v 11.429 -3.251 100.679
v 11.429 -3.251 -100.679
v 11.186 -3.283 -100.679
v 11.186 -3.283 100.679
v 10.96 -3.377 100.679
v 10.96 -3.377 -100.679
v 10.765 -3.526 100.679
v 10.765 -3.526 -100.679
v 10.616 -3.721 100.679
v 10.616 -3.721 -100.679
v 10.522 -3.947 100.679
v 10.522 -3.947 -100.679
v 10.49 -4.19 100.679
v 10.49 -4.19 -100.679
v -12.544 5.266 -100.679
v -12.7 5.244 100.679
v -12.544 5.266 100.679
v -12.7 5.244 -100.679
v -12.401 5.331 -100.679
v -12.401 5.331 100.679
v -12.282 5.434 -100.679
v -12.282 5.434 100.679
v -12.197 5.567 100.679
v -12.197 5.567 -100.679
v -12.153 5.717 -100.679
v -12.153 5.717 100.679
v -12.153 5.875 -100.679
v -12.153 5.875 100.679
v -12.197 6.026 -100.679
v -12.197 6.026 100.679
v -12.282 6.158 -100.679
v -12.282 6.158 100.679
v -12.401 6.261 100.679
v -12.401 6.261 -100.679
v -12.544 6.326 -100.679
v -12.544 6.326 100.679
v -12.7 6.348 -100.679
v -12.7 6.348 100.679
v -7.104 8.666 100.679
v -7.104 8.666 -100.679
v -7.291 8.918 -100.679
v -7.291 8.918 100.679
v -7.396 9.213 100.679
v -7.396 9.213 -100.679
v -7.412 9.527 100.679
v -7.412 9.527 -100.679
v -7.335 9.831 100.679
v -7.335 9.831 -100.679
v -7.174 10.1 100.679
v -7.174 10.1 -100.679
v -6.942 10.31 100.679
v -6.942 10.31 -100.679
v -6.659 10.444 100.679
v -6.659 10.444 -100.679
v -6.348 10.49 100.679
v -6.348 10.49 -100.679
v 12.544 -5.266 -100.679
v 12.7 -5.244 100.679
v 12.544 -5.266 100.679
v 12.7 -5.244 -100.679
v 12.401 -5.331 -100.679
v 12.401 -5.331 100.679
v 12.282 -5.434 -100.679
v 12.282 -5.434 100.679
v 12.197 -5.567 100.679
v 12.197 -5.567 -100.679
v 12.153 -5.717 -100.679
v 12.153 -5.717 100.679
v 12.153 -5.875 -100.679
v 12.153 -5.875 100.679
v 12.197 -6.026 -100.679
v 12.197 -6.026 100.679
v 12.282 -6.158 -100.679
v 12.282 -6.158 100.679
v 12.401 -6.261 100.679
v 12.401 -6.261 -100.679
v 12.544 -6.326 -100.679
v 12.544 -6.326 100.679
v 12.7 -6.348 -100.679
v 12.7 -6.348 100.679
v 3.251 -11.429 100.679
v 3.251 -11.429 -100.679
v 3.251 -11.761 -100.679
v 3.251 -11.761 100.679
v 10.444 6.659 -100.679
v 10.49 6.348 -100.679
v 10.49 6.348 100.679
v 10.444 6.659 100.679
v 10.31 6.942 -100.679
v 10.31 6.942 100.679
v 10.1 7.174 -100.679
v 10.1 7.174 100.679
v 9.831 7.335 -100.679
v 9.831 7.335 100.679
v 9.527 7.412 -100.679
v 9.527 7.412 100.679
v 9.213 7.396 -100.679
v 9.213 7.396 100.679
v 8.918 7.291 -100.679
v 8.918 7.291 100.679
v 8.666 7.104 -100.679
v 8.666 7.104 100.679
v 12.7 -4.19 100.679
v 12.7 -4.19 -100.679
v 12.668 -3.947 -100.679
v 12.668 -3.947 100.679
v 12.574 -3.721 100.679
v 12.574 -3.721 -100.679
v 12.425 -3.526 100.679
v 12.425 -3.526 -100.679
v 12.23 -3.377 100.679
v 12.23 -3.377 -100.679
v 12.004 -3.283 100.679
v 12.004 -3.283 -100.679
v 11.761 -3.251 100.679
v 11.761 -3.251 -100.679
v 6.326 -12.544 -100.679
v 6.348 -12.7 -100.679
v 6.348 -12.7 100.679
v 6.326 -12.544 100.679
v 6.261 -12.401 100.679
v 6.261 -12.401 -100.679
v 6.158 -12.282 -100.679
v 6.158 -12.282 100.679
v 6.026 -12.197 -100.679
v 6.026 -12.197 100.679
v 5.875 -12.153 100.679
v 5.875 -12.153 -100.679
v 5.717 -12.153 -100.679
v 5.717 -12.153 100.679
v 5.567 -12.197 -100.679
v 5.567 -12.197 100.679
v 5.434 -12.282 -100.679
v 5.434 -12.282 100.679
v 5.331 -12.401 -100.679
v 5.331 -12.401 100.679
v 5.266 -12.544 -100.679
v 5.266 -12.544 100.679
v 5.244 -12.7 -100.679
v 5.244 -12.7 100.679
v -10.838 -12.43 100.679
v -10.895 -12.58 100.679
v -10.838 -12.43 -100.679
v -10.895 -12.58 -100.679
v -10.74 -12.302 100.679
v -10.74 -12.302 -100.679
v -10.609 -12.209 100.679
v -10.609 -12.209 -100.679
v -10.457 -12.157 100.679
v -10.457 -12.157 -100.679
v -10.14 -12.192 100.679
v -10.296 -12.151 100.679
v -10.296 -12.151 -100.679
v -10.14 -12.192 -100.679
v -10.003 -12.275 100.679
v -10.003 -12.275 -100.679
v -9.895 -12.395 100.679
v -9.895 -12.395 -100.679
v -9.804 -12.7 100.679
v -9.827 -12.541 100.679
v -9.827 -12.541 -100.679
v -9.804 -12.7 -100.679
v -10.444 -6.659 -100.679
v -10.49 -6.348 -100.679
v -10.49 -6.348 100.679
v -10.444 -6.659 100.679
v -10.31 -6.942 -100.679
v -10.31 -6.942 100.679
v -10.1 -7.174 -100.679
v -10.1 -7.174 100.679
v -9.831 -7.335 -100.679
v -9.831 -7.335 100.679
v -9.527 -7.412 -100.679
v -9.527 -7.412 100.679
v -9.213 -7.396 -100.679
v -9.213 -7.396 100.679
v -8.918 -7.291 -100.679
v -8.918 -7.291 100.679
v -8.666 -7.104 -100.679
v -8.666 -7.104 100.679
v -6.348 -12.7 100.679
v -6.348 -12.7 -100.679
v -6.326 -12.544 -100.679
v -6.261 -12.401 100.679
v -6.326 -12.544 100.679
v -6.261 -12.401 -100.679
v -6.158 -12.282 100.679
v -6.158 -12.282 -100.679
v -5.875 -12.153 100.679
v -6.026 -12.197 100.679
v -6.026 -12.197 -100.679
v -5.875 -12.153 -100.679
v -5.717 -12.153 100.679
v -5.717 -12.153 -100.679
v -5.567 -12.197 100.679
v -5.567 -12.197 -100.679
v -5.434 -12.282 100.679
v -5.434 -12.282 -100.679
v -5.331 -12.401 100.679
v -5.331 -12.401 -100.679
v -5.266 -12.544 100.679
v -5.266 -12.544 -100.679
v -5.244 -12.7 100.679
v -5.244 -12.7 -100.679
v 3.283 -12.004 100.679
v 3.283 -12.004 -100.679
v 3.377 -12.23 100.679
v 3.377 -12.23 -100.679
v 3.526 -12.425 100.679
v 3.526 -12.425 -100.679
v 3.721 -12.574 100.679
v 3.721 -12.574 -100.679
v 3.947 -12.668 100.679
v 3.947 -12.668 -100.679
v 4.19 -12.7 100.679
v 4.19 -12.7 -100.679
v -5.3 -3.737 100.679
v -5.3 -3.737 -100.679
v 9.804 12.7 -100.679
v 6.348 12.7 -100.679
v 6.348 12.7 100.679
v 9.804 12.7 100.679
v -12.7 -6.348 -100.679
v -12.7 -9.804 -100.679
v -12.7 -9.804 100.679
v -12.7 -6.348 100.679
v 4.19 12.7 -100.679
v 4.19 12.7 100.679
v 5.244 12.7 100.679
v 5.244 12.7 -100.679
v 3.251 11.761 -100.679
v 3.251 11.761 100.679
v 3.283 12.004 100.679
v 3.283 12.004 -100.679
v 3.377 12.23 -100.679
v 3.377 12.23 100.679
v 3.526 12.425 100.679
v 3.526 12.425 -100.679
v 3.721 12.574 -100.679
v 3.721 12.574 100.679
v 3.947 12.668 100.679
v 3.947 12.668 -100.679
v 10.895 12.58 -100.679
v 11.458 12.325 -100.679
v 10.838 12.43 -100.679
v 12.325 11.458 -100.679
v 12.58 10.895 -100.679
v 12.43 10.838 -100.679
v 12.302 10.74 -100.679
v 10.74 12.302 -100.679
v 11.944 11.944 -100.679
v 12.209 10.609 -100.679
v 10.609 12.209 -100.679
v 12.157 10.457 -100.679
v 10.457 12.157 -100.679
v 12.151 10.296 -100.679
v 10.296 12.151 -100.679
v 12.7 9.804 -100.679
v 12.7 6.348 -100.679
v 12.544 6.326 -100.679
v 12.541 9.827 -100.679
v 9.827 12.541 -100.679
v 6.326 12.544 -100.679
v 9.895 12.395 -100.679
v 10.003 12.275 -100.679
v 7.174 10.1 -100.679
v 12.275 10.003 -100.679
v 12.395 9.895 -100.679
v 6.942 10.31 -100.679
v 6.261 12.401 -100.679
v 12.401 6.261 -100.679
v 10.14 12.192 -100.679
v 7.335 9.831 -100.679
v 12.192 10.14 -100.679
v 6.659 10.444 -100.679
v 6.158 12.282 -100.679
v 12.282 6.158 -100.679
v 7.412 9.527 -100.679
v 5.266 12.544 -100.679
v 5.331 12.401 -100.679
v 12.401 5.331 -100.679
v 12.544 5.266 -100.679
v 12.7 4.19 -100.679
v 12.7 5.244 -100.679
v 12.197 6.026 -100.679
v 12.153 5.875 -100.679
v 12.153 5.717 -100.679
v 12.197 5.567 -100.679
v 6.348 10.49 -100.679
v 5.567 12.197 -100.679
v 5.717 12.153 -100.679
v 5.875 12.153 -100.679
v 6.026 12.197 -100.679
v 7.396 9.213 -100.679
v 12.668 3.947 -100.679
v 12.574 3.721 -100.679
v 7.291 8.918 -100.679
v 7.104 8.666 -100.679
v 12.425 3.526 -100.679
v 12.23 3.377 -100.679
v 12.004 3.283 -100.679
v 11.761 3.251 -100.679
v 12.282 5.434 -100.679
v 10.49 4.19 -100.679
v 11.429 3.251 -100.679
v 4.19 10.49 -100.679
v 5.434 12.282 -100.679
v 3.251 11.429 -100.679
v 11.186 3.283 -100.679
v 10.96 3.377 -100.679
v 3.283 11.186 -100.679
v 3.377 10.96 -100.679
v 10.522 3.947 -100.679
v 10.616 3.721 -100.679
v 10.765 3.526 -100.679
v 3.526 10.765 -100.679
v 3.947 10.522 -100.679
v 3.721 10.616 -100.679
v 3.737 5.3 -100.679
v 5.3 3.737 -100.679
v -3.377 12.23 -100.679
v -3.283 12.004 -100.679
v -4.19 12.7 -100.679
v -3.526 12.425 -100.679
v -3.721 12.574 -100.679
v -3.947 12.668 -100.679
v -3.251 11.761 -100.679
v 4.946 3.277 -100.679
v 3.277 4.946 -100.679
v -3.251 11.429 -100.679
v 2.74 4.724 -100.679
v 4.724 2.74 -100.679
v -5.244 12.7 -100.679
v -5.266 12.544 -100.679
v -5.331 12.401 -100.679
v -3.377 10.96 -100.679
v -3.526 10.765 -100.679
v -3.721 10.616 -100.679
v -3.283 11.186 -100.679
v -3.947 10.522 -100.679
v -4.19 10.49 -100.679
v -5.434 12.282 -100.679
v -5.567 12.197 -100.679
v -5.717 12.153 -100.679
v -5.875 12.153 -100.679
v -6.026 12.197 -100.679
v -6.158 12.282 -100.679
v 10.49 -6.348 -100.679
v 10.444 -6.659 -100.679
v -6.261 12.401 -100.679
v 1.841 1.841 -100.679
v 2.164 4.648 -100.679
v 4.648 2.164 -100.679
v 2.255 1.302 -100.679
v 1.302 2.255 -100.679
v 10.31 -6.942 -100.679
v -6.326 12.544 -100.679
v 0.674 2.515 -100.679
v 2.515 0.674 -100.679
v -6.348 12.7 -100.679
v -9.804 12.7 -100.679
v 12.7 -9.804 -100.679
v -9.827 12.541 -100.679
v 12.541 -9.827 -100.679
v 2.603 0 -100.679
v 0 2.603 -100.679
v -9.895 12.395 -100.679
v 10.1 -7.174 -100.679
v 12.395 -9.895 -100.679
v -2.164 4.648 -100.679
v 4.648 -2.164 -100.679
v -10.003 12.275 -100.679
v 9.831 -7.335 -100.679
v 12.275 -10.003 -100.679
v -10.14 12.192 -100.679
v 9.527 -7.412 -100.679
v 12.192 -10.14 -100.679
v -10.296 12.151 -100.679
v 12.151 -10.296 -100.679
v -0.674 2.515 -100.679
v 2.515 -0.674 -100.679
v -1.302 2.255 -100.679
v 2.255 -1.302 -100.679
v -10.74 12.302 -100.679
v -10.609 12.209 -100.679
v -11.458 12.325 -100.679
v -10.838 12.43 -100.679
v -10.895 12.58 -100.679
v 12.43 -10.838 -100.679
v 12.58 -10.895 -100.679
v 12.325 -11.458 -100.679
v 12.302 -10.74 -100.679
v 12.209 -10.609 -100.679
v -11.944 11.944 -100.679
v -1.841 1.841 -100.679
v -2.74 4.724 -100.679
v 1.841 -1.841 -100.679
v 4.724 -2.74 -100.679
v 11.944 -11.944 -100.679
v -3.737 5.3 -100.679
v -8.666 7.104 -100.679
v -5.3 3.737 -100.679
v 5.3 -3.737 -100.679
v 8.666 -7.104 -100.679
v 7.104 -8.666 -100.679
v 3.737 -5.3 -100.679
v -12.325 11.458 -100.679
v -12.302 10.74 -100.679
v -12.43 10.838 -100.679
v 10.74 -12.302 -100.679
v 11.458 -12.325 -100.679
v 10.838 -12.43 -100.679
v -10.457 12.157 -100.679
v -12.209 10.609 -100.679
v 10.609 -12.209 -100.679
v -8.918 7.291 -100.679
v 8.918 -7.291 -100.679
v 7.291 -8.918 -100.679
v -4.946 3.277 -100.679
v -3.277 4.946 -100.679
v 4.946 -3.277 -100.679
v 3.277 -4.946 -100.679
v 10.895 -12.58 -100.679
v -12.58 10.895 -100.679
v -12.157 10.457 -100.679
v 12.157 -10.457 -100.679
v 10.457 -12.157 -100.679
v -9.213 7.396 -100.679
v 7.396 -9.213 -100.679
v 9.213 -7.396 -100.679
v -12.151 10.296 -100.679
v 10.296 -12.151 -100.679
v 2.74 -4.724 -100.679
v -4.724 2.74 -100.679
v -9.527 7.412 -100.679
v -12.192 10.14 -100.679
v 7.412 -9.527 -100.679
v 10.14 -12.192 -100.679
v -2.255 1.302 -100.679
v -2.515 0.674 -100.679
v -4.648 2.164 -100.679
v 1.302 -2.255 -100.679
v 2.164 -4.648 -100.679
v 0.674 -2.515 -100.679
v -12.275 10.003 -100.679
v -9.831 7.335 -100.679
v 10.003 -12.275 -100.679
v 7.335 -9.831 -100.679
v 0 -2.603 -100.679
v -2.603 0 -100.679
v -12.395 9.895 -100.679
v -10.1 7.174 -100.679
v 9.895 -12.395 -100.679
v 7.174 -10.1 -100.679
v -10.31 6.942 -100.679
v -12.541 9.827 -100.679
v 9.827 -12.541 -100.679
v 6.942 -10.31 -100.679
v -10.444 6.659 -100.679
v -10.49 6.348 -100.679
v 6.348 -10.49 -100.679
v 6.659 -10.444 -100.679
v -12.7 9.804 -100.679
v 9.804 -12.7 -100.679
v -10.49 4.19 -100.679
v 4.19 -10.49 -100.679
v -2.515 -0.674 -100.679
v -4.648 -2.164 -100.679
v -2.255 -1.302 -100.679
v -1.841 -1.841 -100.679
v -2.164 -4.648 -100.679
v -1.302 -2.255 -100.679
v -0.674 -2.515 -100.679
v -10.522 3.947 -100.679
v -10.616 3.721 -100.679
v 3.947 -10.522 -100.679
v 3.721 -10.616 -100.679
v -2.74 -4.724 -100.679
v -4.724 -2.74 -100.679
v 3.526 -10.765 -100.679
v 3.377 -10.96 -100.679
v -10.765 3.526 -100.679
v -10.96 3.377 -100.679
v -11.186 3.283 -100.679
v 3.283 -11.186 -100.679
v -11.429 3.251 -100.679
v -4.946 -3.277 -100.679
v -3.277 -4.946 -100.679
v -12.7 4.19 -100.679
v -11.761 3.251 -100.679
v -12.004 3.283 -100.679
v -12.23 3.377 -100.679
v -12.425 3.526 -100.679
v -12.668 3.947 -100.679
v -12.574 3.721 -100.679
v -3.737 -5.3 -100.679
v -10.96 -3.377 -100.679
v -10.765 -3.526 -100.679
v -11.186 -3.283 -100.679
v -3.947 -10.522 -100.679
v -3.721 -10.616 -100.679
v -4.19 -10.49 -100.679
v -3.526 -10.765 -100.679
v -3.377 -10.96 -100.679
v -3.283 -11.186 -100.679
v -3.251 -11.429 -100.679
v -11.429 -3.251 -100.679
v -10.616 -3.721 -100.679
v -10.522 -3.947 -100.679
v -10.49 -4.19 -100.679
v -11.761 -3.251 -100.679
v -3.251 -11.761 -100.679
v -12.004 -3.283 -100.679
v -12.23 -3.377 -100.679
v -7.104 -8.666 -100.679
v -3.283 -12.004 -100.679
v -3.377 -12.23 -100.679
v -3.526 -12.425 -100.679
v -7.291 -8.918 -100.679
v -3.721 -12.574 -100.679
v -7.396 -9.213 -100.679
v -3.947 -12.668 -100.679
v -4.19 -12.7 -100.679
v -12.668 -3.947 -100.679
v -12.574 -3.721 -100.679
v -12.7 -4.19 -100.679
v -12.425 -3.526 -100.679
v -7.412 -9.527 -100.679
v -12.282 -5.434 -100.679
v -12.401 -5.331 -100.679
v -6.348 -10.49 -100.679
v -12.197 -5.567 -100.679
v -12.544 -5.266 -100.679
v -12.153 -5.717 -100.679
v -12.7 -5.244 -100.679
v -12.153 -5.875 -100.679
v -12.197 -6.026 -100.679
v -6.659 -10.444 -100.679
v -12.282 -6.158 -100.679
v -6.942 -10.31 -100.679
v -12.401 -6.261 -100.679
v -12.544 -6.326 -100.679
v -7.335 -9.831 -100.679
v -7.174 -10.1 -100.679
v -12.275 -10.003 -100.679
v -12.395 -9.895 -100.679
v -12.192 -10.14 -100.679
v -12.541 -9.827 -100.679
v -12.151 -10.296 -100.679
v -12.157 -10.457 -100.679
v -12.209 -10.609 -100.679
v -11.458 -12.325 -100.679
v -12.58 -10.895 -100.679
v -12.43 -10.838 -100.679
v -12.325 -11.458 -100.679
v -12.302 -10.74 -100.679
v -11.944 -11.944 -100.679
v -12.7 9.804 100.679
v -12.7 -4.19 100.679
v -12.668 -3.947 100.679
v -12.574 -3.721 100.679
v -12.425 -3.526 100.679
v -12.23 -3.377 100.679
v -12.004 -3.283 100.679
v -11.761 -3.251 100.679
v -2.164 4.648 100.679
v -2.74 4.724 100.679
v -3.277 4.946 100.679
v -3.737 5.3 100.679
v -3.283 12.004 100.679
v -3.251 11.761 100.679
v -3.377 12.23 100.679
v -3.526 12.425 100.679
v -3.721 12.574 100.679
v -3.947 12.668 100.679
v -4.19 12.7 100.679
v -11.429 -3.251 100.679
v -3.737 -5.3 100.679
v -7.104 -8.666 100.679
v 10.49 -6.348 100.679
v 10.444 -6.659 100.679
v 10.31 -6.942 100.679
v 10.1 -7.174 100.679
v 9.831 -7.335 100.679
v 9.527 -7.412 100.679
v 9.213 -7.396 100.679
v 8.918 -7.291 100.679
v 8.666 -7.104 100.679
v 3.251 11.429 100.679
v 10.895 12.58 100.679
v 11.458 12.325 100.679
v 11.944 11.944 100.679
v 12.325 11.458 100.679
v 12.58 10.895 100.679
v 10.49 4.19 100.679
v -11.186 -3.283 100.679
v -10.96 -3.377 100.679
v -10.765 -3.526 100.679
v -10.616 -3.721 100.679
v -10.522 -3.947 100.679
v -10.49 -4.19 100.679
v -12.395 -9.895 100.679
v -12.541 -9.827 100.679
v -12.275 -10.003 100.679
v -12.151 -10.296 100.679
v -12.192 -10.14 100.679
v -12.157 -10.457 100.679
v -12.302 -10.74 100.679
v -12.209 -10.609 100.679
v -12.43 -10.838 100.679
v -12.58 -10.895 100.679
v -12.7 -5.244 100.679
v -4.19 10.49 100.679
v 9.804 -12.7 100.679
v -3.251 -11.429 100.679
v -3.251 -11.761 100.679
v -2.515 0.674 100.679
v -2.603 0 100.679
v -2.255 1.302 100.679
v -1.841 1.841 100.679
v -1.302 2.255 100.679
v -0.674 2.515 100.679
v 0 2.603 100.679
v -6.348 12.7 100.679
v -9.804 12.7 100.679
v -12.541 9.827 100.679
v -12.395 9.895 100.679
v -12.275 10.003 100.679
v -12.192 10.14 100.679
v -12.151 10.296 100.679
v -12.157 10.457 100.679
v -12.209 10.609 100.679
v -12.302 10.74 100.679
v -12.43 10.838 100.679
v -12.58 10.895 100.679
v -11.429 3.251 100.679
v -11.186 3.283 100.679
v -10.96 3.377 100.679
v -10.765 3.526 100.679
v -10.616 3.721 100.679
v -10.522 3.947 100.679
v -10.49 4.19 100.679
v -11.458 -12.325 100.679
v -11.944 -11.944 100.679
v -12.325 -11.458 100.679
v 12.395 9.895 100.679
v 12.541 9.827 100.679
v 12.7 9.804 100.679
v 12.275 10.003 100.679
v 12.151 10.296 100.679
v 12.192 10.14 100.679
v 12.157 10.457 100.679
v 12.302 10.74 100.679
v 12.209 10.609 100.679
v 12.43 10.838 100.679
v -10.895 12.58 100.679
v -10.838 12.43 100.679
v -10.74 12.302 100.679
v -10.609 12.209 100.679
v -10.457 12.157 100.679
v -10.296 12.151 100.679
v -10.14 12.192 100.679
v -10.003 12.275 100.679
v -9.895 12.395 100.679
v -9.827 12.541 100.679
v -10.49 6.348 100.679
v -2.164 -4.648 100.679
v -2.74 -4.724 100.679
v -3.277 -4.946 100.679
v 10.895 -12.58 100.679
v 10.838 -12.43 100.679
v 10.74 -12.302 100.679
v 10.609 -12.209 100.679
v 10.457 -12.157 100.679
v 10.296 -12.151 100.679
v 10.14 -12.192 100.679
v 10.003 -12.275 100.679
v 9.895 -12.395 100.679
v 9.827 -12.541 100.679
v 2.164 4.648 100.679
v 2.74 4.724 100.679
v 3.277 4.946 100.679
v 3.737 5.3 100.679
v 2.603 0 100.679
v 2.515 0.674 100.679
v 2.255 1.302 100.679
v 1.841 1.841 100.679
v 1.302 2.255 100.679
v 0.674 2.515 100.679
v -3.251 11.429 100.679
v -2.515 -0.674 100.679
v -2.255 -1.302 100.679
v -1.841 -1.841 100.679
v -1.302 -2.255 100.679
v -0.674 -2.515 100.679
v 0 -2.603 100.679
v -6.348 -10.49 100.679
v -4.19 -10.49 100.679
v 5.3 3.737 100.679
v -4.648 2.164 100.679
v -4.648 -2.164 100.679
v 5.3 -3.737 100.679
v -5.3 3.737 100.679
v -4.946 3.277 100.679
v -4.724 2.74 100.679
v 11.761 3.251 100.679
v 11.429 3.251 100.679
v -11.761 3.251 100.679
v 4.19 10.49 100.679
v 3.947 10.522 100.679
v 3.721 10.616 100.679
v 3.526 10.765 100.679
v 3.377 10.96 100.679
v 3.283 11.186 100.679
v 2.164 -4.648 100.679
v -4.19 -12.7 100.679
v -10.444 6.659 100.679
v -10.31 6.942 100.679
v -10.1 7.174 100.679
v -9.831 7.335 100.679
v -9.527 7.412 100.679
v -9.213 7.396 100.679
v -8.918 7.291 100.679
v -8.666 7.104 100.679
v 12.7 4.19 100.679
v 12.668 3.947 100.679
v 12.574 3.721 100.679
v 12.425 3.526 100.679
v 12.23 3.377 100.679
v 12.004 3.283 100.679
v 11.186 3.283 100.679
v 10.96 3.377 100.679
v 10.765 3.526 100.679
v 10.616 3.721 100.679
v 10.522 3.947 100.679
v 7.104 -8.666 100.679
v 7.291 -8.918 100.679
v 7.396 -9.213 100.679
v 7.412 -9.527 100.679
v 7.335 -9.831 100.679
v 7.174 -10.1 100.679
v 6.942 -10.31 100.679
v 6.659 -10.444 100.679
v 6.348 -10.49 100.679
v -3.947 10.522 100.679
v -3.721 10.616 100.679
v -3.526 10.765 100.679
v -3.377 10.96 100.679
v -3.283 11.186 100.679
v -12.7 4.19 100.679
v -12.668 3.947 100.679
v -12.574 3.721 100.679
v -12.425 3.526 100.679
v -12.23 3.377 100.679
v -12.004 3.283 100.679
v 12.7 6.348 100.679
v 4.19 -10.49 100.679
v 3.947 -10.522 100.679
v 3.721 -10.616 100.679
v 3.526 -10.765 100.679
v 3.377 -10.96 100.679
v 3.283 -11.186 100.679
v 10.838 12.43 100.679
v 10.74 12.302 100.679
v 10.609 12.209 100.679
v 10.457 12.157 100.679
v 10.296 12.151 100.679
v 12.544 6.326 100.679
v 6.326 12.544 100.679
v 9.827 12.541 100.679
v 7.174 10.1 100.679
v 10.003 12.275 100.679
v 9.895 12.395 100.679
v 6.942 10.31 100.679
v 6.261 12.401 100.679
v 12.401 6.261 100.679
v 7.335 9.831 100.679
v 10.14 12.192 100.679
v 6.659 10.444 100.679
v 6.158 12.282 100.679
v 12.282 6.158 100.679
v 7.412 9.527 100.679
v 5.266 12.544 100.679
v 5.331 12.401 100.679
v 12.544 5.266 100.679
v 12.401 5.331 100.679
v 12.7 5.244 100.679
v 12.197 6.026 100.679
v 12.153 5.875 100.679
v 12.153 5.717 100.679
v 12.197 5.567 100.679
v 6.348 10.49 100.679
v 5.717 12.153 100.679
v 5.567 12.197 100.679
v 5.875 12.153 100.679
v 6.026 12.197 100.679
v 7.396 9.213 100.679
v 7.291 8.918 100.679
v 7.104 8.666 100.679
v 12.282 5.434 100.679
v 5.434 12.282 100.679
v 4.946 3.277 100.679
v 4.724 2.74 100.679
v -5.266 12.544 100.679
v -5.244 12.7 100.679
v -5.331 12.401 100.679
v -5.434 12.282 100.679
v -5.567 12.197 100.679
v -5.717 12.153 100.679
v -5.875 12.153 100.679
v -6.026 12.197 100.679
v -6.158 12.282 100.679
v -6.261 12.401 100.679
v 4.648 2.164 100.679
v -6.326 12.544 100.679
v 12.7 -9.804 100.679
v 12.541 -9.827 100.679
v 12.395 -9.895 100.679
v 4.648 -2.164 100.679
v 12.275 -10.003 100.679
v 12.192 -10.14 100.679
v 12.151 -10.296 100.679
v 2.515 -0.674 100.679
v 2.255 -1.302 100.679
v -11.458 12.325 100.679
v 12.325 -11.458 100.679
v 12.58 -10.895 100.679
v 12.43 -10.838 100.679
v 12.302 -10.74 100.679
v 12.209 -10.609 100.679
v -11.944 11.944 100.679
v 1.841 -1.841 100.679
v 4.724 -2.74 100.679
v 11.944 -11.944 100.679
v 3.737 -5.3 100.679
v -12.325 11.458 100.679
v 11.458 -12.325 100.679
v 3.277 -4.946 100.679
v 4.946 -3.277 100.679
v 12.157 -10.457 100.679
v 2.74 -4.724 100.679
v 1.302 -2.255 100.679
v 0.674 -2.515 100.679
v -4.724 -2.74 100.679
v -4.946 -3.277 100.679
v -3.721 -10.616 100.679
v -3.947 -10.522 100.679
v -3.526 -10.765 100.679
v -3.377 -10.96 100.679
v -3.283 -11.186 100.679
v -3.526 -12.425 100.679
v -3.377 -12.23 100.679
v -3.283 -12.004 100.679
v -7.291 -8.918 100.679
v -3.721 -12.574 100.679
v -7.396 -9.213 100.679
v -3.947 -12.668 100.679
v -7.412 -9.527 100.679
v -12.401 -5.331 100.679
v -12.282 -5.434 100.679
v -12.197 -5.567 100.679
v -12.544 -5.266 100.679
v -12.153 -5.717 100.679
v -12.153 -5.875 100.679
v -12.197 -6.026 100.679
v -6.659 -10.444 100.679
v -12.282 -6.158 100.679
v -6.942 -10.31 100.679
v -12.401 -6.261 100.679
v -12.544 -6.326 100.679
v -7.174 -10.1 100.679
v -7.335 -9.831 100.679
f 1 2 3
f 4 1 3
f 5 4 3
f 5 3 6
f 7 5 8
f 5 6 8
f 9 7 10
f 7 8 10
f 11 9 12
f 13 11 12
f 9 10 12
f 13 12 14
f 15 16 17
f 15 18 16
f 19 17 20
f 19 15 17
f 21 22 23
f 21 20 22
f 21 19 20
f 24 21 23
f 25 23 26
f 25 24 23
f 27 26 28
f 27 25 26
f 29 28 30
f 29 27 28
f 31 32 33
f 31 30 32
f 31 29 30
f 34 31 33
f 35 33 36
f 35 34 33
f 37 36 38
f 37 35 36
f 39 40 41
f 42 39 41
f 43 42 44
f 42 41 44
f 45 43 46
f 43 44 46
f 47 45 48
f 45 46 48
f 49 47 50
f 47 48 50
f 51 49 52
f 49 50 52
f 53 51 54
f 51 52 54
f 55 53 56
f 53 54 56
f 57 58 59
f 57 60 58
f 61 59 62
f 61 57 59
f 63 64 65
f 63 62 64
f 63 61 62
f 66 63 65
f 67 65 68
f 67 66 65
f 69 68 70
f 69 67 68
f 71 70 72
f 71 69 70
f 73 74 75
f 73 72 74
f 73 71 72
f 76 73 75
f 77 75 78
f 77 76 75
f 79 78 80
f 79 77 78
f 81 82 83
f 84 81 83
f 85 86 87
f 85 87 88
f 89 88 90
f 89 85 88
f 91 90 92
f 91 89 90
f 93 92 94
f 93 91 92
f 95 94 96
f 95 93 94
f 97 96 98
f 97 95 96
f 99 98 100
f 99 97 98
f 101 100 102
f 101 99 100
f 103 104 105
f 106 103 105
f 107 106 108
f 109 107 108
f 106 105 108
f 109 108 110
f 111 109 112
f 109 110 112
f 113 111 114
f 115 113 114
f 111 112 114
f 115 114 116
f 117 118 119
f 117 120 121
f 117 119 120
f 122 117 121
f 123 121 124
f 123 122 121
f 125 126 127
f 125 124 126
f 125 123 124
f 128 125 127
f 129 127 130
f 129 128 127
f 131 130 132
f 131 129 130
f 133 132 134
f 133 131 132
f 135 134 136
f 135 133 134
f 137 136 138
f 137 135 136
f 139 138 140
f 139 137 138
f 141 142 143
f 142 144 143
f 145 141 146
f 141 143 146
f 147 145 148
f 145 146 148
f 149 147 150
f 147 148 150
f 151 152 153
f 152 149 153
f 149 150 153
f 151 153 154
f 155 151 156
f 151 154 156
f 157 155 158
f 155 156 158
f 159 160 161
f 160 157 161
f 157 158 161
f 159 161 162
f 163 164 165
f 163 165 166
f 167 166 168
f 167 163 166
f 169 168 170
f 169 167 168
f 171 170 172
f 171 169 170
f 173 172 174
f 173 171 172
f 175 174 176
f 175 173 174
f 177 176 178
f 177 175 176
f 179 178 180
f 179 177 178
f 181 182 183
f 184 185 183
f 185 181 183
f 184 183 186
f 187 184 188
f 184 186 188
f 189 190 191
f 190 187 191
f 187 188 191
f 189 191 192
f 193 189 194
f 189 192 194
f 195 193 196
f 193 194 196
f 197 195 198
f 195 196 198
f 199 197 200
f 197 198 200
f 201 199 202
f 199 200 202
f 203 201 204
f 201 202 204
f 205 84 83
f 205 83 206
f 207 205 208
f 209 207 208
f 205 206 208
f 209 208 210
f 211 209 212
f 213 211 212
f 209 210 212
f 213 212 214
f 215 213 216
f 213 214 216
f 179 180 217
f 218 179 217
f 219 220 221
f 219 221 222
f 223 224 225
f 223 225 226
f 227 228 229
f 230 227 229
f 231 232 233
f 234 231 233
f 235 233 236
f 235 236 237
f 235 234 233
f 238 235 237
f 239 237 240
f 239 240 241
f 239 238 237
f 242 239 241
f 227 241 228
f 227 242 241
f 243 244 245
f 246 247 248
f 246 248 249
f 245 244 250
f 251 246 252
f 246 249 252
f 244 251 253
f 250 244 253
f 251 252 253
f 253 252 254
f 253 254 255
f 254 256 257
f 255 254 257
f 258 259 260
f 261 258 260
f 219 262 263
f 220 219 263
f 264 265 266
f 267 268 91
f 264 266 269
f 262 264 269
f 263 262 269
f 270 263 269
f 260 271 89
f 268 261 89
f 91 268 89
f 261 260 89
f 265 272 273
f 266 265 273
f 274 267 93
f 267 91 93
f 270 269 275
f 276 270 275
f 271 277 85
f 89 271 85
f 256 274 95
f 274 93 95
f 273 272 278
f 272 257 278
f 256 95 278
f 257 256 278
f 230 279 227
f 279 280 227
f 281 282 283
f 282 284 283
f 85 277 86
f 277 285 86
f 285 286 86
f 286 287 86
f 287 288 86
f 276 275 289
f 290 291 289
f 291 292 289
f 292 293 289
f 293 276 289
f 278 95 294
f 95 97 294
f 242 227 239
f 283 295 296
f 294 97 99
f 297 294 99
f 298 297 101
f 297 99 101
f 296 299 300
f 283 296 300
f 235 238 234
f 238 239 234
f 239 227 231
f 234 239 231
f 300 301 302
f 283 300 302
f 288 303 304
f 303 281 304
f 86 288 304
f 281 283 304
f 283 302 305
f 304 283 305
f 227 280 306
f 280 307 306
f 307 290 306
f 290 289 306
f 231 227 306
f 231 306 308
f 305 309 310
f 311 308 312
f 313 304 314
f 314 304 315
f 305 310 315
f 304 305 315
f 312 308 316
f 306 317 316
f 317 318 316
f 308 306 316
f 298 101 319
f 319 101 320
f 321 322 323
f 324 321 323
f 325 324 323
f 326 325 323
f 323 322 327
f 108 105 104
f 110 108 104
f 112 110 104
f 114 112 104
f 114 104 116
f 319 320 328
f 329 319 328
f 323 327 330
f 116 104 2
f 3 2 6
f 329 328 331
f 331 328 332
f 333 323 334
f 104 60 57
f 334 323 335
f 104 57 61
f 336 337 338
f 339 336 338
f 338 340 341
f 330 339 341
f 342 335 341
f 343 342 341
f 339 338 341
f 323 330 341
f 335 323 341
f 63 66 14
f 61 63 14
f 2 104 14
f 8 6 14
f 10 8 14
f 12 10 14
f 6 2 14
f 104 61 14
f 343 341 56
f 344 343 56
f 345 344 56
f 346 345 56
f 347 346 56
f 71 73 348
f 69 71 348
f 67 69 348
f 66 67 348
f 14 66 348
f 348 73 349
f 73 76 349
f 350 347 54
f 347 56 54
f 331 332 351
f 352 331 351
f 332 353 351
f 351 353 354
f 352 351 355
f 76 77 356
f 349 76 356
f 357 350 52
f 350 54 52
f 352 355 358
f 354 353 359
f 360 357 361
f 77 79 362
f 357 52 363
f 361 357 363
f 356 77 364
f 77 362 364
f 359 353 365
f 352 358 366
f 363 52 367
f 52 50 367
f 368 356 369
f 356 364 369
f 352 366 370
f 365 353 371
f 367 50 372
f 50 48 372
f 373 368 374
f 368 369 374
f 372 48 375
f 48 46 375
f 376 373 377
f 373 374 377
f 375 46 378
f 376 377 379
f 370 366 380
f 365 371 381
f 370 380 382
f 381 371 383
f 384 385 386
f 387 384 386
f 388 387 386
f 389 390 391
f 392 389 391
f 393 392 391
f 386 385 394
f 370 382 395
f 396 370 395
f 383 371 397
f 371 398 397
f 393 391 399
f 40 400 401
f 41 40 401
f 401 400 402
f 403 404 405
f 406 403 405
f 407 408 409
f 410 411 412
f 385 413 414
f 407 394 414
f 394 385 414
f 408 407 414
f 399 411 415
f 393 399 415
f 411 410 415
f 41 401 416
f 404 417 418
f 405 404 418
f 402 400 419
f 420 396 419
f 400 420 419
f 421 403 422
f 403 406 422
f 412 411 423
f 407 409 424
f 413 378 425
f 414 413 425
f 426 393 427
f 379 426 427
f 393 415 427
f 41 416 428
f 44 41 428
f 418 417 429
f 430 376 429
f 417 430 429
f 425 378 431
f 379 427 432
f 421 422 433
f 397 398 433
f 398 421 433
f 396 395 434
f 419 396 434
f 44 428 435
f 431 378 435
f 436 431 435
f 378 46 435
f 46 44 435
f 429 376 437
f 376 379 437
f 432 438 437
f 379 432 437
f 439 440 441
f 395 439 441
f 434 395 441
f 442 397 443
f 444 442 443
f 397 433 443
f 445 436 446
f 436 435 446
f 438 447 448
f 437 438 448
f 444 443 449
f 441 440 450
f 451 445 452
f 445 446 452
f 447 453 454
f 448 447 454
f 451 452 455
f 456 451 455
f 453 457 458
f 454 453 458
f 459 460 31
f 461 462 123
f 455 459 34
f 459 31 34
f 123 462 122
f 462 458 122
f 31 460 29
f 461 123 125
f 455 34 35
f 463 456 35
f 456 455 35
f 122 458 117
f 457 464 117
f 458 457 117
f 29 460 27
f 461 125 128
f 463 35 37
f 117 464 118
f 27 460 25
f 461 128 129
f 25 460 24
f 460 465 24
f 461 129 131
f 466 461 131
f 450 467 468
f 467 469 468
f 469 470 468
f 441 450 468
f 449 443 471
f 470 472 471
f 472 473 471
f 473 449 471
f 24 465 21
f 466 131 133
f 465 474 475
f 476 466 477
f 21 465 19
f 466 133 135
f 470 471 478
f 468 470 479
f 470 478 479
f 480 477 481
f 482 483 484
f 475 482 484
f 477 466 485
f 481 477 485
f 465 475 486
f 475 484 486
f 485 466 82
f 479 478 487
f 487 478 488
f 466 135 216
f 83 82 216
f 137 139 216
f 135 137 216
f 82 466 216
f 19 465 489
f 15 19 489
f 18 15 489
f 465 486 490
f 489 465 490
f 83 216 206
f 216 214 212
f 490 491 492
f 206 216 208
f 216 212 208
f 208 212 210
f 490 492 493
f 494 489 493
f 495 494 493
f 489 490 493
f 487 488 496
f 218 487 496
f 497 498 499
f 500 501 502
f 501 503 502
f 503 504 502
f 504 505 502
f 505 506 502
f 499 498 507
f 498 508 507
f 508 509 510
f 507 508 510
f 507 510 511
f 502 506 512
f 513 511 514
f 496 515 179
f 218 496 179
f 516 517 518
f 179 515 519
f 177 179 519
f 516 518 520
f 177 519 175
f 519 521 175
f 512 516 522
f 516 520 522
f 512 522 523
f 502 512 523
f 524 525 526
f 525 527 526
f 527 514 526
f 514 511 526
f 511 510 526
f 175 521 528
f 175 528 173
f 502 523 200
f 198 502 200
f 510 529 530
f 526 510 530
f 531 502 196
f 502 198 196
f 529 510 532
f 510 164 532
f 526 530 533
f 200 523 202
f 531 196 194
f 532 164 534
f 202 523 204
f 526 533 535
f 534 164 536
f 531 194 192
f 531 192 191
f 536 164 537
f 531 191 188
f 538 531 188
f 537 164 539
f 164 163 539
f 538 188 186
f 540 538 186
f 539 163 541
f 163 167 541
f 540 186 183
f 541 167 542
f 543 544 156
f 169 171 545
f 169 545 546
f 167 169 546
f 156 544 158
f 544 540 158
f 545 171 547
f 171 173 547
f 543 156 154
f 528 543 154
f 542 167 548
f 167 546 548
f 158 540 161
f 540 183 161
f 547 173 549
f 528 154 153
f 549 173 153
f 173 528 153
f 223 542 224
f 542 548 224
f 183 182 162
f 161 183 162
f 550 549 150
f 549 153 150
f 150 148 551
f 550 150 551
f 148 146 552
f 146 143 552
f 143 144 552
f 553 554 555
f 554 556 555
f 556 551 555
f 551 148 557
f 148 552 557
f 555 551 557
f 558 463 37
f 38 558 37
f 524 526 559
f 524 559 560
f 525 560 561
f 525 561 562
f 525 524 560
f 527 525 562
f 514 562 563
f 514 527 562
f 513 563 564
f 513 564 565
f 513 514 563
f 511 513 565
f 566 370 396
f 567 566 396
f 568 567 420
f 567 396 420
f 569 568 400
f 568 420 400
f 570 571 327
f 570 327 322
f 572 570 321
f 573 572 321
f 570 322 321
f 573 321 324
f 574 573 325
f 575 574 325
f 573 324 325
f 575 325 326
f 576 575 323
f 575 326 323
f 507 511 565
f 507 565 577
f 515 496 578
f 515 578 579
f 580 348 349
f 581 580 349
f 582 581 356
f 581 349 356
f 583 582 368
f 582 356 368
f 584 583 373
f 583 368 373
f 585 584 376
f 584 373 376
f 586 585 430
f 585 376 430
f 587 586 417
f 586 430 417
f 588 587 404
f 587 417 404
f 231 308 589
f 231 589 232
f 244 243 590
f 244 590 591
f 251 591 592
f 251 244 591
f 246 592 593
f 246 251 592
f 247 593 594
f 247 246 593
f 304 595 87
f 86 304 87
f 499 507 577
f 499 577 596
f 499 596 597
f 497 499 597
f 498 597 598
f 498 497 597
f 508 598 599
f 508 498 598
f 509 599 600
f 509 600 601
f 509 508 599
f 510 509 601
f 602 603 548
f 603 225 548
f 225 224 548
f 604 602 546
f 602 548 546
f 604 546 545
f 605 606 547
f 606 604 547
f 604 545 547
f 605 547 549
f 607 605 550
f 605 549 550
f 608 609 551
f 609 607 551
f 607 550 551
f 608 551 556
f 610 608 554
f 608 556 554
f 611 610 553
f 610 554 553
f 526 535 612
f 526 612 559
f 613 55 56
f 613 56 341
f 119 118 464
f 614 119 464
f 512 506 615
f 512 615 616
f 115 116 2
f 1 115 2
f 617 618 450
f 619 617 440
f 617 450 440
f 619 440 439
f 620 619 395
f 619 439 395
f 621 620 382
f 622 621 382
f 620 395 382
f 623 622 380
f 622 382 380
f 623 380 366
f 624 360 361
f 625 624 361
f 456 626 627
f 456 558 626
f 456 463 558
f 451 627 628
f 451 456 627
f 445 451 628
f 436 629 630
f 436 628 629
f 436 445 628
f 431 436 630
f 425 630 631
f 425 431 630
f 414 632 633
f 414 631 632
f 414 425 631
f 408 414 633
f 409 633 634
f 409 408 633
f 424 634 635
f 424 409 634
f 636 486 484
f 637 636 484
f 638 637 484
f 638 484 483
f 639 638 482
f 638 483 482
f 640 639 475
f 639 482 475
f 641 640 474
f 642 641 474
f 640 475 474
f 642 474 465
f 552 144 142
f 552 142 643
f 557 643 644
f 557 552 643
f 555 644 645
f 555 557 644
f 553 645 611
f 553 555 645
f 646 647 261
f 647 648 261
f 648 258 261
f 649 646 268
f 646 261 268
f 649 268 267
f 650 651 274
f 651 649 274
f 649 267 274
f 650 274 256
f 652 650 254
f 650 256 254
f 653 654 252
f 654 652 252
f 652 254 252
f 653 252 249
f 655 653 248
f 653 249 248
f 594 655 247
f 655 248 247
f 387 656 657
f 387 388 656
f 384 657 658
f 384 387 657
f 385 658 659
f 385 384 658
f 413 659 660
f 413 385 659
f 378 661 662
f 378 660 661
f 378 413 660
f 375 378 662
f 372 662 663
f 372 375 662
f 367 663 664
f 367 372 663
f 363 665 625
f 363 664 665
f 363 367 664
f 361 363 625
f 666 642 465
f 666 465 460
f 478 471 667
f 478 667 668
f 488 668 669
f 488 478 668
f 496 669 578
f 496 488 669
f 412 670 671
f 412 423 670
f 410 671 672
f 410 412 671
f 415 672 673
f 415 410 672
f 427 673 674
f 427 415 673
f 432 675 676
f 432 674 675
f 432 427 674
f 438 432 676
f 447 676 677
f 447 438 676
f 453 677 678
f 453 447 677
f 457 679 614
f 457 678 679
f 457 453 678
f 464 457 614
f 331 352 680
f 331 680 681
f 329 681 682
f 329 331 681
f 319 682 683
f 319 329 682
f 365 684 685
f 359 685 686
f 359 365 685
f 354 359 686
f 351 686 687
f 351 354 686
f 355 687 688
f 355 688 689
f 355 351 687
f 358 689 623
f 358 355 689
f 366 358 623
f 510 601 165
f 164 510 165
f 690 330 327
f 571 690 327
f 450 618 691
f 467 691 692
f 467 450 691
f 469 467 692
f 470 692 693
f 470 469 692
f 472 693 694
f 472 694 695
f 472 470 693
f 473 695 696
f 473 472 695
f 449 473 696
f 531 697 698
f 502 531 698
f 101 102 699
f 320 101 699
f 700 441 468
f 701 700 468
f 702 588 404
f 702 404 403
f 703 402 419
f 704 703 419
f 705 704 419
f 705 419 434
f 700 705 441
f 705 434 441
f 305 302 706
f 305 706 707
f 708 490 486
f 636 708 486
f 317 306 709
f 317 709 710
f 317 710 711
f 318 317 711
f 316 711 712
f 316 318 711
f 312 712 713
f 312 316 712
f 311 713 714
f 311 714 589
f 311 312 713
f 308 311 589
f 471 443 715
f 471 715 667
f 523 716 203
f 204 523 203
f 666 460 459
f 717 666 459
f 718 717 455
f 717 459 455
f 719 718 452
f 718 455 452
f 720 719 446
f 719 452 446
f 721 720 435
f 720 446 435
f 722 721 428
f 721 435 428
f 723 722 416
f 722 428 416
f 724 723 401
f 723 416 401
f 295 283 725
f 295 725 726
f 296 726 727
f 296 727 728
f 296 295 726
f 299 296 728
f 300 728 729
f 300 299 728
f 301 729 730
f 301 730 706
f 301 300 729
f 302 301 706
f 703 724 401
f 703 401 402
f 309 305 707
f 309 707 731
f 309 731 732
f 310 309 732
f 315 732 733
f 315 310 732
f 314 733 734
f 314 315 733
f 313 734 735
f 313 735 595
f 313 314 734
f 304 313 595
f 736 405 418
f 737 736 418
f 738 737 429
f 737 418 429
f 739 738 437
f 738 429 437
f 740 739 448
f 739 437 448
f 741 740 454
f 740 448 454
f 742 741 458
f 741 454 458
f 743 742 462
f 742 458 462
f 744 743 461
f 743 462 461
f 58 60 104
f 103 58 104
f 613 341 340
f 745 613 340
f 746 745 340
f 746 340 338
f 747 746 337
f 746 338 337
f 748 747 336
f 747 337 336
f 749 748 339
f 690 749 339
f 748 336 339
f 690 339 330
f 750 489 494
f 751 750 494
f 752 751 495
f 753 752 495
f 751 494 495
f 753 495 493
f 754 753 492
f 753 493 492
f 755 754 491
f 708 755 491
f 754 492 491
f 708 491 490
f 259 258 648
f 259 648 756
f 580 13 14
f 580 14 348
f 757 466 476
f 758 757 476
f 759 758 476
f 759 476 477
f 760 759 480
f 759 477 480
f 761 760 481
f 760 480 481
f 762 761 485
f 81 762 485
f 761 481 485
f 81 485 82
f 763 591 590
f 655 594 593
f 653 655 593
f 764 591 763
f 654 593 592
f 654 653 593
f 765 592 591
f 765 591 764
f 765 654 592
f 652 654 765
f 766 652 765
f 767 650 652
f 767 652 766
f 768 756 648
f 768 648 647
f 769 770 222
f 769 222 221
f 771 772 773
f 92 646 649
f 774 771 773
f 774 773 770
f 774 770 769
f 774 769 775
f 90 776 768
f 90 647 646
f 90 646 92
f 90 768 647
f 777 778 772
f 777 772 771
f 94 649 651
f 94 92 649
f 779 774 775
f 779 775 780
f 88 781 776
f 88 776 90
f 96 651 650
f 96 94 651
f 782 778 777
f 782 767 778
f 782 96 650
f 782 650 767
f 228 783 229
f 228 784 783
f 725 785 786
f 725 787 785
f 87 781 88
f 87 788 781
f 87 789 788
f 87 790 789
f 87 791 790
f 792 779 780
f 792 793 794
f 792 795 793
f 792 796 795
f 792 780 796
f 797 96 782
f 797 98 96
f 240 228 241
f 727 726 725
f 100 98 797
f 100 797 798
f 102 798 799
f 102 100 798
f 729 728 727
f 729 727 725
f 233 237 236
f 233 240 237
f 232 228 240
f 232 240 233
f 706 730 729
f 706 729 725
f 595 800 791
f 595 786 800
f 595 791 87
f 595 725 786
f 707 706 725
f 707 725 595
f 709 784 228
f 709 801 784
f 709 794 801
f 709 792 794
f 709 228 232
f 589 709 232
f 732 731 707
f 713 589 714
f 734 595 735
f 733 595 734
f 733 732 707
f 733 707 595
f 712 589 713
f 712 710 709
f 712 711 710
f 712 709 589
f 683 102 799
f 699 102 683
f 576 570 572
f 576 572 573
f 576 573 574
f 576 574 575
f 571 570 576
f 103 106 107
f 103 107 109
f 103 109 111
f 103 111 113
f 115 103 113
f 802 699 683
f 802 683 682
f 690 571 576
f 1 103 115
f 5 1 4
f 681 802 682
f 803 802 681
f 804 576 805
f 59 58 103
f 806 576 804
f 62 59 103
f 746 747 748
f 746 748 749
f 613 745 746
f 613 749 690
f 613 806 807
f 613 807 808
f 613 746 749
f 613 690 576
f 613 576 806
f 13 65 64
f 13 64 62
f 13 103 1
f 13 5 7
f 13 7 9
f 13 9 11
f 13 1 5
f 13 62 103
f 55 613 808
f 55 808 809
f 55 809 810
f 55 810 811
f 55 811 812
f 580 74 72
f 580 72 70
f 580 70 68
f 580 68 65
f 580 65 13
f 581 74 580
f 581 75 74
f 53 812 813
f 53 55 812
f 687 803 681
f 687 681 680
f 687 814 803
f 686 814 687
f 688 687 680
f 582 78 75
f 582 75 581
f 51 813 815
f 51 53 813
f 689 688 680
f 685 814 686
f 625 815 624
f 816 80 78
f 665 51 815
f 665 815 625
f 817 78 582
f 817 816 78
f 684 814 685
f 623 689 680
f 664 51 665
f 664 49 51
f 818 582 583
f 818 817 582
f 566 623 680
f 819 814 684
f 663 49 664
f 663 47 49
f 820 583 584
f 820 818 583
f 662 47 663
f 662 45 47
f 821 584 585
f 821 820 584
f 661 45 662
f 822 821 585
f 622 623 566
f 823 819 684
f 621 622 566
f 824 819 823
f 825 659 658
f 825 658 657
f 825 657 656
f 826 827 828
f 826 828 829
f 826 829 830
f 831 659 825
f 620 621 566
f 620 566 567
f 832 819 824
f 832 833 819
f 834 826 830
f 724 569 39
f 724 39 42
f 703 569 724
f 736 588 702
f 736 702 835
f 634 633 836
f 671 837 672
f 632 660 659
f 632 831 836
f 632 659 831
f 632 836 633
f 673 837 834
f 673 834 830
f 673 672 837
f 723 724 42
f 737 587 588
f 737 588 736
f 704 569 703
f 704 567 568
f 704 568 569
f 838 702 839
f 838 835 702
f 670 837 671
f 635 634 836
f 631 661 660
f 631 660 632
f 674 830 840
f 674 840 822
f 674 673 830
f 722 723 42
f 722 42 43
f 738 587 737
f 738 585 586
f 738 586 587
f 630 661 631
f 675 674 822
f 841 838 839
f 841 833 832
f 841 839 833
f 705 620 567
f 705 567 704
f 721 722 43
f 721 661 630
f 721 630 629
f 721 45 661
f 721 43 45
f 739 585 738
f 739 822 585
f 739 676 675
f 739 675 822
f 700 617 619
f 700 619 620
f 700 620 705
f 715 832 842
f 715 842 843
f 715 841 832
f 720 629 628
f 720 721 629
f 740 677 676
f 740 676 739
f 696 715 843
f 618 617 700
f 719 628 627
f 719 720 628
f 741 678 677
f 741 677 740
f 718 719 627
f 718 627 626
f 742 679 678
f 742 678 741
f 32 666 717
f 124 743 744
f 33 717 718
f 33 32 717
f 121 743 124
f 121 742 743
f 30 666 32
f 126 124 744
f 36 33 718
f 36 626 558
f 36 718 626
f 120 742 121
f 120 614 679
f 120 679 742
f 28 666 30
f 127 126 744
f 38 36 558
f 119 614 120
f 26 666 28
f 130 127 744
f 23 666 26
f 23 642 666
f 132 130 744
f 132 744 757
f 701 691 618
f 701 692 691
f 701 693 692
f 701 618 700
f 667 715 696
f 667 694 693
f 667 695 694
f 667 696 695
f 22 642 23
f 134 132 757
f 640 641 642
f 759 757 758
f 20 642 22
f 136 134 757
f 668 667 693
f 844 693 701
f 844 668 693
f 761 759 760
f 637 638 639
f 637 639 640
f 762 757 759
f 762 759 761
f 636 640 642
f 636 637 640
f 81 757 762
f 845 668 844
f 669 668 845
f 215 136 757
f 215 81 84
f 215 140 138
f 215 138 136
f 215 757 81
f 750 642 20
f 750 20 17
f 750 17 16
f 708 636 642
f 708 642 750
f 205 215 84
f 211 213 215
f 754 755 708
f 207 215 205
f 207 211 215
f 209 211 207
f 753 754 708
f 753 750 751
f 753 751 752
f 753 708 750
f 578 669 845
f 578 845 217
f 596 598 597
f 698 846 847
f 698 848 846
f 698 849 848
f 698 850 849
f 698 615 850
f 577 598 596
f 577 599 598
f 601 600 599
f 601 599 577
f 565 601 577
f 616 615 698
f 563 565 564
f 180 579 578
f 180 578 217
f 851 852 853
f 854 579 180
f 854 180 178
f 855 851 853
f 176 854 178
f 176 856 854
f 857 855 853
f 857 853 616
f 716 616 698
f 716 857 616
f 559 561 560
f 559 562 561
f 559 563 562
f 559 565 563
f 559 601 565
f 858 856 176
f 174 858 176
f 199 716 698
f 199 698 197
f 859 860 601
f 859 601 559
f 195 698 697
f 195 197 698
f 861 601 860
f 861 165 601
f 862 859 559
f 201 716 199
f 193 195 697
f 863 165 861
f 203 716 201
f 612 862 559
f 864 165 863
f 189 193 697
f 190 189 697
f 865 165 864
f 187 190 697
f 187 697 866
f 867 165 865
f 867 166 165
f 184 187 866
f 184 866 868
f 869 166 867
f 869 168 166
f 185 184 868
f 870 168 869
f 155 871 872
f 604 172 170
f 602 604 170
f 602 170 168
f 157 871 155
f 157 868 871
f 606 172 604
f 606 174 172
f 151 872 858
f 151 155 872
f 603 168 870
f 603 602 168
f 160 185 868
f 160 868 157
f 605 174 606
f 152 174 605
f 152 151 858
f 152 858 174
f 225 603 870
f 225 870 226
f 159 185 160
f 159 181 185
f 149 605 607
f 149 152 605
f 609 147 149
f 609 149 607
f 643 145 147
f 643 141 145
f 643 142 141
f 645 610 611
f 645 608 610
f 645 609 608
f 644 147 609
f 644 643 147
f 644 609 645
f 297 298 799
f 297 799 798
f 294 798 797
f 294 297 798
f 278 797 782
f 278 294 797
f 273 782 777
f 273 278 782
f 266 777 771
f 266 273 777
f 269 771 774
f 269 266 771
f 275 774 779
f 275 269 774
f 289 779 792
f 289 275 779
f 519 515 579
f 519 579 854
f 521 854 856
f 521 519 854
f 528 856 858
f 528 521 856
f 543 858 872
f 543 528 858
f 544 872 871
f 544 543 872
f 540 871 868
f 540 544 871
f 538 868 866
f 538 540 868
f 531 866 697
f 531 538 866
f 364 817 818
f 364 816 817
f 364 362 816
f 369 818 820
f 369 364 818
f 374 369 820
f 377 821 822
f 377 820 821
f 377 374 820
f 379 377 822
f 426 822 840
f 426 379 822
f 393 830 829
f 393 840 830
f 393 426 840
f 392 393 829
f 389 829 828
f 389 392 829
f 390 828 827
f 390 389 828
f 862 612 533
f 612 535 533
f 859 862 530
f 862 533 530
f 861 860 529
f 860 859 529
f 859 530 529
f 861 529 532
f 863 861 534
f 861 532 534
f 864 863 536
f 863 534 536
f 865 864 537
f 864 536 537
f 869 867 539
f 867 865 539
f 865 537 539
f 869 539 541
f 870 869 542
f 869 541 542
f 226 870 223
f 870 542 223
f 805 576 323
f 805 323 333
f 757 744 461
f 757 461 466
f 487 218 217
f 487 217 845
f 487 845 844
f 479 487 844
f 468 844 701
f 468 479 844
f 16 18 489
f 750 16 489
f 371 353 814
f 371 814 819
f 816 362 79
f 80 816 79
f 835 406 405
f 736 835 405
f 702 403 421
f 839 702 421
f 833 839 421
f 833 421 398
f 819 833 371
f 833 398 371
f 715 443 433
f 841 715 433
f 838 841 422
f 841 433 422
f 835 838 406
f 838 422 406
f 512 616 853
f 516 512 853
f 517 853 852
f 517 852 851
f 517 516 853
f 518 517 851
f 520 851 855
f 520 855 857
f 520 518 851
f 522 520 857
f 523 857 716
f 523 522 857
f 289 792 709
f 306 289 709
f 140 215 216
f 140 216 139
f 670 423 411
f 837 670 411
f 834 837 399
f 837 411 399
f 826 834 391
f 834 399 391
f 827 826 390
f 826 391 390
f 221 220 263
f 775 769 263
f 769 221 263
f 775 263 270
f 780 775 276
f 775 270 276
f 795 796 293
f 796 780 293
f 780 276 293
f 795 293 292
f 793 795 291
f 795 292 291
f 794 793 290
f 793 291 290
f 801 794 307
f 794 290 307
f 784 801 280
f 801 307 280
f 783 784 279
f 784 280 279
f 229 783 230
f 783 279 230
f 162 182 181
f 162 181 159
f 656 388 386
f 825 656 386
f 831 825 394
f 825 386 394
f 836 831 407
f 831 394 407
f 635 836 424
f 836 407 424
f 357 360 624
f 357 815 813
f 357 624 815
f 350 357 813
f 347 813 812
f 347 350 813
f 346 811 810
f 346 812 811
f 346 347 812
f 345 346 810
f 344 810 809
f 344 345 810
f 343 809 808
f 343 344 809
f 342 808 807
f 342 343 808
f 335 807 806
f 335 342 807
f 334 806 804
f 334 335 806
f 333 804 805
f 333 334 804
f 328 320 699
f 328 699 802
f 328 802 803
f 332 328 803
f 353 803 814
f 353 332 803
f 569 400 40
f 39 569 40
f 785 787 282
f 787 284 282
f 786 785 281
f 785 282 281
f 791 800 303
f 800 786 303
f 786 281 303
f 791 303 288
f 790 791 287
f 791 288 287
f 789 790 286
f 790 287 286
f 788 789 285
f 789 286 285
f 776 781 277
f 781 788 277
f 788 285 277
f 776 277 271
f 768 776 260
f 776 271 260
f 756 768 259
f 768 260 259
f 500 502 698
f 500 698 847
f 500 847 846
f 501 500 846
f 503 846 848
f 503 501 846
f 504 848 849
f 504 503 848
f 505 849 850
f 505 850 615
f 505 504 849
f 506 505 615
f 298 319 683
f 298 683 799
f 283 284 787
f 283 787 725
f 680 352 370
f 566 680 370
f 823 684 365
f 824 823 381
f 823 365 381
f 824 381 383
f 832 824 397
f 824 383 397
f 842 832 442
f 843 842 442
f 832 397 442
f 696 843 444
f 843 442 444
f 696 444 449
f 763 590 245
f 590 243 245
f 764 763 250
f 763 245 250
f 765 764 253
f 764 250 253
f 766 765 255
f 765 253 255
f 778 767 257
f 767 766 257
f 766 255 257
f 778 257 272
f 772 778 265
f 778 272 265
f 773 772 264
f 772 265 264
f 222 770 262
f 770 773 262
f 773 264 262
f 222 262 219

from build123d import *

# Parameters (mm, degrees)
BOSS_EXTRUDE1_START     = -100.679312
BOSS_EXTRUDE1_DEPTH     = 201.358624
CUT_EXTRUDE1_DEPTH      = 103.268782455
CUT_EXTRUDE1_DEPTH_BACK = 103.268782455
SKETCH5_R               = 0.55245


with BuildPart() as part:
    # Sketch4 → Boss-Extrude1 (new body)
    with BuildSketch(Plane.XY.offset(BOSS_EXTRUDE1_START)):
        with BuildLine():
            Line((4.190365, -12.7), (10.11729625, -12.7))
            ThreePointArc((10.11729625, -12.7), (11.943543585, -11.943543585), (12.7, -10.11729625))
            Line((12.7, -10.11729625), (12.7, -4.190365))
            ThreePointArc((12.7, -4.190365), (12.42492494, -3.52627506), (11.760835, -3.2512))
            Line((11.760835, -3.2512), (11.429365, -3.2512))
            ThreePointArc((11.429365, -3.2512), (10.76527506, -3.52627506), (10.4902, -4.190365))
            Line((10.4902, -4.190365), (10.4902, -6.348478019))
            ThreePointArc((10.4902, -6.348478019), (9.830707141, -7.335478831), (8.666460301, -7.103895736))
            Line((8.666460301, -7.103895736), (5.299899128, -3.737334563))
            ThreePointArc((5.299899128, -3.737334563), (4.817571085, -3.015479634), (4.6482, -2.16399369))
            Line((4.6482, -2.16399369), (4.6482, 0))
            Line((4.6482, 0), (2.6035, 0))
            ThreePointArc((2.6035, 0), (1.840952505, -1.840952505), (0, -2.6035))
            Line((0, -2.6035), (0, -4.6482))
            Line((0, -4.6482), (2.16399369, -4.6482))
            ThreePointArc((2.16399369, -4.6482), (3.015479634, -4.817571085), (3.737334563, -5.299899128))
            Line((3.737334563, -5.299899128), (7.103895736, -8.666460301))
            ThreePointArc((7.103895736, -8.666460301), (7.335478831, -9.830707141), (6.348478019, -10.4902))
            Line((6.348478019, -10.4902), (4.190365, -10.4902))
            ThreePointArc((4.190365, -10.4902), (3.52627506, -10.76527506), (3.2512, -11.429365))
            Line((3.2512, -11.429365), (3.2512, -11.760835))
            ThreePointArc((3.2512, -11.760835), (3.52627506, -12.42492494), (4.190365, -12.7))
        make_face()
    extrude(amount=BOSS_EXTRUDE1_DEPTH)

    # Sketch5 → Cut-Extrude1 (cut, two sides: drawn at the far end of the back side and taken through both)
    with BuildSketch(Plane.XY.offset(-CUT_EXTRUDE1_DEPTH_BACK)):
        with Locations((10.356153152, -12.7)):
            Circle(SKETCH5_R)
        with Locations((5.796028019, -12.7)):
            Circle(SKETCH5_R)
        with Locations((12.7, -10.356153152)):
            Circle(SKETCH5_R)
        with Locations((12.7, -5.796028019)):
            Circle(SKETCH5_R)
    extrude(amount=CUT_EXTRUDE1_DEPTH + CUT_EXTRUDE1_DEPTH_BACK, mode=Mode.SUBTRACT)

    # Mirror1: part across plane


with BuildPart() as part_1:
    add(part.part)
    add(part.part.mirror(Plane(origin=(0, 0, 0), x_dir=(0, 0, 1), z_dir=(1, 0, 0))))

    # Mirror2: part across plane


with BuildPart() as part_2:
    add(part_1.part)
    add(part_1.part.mirror(Plane.ZX))


solid = part_2.part
